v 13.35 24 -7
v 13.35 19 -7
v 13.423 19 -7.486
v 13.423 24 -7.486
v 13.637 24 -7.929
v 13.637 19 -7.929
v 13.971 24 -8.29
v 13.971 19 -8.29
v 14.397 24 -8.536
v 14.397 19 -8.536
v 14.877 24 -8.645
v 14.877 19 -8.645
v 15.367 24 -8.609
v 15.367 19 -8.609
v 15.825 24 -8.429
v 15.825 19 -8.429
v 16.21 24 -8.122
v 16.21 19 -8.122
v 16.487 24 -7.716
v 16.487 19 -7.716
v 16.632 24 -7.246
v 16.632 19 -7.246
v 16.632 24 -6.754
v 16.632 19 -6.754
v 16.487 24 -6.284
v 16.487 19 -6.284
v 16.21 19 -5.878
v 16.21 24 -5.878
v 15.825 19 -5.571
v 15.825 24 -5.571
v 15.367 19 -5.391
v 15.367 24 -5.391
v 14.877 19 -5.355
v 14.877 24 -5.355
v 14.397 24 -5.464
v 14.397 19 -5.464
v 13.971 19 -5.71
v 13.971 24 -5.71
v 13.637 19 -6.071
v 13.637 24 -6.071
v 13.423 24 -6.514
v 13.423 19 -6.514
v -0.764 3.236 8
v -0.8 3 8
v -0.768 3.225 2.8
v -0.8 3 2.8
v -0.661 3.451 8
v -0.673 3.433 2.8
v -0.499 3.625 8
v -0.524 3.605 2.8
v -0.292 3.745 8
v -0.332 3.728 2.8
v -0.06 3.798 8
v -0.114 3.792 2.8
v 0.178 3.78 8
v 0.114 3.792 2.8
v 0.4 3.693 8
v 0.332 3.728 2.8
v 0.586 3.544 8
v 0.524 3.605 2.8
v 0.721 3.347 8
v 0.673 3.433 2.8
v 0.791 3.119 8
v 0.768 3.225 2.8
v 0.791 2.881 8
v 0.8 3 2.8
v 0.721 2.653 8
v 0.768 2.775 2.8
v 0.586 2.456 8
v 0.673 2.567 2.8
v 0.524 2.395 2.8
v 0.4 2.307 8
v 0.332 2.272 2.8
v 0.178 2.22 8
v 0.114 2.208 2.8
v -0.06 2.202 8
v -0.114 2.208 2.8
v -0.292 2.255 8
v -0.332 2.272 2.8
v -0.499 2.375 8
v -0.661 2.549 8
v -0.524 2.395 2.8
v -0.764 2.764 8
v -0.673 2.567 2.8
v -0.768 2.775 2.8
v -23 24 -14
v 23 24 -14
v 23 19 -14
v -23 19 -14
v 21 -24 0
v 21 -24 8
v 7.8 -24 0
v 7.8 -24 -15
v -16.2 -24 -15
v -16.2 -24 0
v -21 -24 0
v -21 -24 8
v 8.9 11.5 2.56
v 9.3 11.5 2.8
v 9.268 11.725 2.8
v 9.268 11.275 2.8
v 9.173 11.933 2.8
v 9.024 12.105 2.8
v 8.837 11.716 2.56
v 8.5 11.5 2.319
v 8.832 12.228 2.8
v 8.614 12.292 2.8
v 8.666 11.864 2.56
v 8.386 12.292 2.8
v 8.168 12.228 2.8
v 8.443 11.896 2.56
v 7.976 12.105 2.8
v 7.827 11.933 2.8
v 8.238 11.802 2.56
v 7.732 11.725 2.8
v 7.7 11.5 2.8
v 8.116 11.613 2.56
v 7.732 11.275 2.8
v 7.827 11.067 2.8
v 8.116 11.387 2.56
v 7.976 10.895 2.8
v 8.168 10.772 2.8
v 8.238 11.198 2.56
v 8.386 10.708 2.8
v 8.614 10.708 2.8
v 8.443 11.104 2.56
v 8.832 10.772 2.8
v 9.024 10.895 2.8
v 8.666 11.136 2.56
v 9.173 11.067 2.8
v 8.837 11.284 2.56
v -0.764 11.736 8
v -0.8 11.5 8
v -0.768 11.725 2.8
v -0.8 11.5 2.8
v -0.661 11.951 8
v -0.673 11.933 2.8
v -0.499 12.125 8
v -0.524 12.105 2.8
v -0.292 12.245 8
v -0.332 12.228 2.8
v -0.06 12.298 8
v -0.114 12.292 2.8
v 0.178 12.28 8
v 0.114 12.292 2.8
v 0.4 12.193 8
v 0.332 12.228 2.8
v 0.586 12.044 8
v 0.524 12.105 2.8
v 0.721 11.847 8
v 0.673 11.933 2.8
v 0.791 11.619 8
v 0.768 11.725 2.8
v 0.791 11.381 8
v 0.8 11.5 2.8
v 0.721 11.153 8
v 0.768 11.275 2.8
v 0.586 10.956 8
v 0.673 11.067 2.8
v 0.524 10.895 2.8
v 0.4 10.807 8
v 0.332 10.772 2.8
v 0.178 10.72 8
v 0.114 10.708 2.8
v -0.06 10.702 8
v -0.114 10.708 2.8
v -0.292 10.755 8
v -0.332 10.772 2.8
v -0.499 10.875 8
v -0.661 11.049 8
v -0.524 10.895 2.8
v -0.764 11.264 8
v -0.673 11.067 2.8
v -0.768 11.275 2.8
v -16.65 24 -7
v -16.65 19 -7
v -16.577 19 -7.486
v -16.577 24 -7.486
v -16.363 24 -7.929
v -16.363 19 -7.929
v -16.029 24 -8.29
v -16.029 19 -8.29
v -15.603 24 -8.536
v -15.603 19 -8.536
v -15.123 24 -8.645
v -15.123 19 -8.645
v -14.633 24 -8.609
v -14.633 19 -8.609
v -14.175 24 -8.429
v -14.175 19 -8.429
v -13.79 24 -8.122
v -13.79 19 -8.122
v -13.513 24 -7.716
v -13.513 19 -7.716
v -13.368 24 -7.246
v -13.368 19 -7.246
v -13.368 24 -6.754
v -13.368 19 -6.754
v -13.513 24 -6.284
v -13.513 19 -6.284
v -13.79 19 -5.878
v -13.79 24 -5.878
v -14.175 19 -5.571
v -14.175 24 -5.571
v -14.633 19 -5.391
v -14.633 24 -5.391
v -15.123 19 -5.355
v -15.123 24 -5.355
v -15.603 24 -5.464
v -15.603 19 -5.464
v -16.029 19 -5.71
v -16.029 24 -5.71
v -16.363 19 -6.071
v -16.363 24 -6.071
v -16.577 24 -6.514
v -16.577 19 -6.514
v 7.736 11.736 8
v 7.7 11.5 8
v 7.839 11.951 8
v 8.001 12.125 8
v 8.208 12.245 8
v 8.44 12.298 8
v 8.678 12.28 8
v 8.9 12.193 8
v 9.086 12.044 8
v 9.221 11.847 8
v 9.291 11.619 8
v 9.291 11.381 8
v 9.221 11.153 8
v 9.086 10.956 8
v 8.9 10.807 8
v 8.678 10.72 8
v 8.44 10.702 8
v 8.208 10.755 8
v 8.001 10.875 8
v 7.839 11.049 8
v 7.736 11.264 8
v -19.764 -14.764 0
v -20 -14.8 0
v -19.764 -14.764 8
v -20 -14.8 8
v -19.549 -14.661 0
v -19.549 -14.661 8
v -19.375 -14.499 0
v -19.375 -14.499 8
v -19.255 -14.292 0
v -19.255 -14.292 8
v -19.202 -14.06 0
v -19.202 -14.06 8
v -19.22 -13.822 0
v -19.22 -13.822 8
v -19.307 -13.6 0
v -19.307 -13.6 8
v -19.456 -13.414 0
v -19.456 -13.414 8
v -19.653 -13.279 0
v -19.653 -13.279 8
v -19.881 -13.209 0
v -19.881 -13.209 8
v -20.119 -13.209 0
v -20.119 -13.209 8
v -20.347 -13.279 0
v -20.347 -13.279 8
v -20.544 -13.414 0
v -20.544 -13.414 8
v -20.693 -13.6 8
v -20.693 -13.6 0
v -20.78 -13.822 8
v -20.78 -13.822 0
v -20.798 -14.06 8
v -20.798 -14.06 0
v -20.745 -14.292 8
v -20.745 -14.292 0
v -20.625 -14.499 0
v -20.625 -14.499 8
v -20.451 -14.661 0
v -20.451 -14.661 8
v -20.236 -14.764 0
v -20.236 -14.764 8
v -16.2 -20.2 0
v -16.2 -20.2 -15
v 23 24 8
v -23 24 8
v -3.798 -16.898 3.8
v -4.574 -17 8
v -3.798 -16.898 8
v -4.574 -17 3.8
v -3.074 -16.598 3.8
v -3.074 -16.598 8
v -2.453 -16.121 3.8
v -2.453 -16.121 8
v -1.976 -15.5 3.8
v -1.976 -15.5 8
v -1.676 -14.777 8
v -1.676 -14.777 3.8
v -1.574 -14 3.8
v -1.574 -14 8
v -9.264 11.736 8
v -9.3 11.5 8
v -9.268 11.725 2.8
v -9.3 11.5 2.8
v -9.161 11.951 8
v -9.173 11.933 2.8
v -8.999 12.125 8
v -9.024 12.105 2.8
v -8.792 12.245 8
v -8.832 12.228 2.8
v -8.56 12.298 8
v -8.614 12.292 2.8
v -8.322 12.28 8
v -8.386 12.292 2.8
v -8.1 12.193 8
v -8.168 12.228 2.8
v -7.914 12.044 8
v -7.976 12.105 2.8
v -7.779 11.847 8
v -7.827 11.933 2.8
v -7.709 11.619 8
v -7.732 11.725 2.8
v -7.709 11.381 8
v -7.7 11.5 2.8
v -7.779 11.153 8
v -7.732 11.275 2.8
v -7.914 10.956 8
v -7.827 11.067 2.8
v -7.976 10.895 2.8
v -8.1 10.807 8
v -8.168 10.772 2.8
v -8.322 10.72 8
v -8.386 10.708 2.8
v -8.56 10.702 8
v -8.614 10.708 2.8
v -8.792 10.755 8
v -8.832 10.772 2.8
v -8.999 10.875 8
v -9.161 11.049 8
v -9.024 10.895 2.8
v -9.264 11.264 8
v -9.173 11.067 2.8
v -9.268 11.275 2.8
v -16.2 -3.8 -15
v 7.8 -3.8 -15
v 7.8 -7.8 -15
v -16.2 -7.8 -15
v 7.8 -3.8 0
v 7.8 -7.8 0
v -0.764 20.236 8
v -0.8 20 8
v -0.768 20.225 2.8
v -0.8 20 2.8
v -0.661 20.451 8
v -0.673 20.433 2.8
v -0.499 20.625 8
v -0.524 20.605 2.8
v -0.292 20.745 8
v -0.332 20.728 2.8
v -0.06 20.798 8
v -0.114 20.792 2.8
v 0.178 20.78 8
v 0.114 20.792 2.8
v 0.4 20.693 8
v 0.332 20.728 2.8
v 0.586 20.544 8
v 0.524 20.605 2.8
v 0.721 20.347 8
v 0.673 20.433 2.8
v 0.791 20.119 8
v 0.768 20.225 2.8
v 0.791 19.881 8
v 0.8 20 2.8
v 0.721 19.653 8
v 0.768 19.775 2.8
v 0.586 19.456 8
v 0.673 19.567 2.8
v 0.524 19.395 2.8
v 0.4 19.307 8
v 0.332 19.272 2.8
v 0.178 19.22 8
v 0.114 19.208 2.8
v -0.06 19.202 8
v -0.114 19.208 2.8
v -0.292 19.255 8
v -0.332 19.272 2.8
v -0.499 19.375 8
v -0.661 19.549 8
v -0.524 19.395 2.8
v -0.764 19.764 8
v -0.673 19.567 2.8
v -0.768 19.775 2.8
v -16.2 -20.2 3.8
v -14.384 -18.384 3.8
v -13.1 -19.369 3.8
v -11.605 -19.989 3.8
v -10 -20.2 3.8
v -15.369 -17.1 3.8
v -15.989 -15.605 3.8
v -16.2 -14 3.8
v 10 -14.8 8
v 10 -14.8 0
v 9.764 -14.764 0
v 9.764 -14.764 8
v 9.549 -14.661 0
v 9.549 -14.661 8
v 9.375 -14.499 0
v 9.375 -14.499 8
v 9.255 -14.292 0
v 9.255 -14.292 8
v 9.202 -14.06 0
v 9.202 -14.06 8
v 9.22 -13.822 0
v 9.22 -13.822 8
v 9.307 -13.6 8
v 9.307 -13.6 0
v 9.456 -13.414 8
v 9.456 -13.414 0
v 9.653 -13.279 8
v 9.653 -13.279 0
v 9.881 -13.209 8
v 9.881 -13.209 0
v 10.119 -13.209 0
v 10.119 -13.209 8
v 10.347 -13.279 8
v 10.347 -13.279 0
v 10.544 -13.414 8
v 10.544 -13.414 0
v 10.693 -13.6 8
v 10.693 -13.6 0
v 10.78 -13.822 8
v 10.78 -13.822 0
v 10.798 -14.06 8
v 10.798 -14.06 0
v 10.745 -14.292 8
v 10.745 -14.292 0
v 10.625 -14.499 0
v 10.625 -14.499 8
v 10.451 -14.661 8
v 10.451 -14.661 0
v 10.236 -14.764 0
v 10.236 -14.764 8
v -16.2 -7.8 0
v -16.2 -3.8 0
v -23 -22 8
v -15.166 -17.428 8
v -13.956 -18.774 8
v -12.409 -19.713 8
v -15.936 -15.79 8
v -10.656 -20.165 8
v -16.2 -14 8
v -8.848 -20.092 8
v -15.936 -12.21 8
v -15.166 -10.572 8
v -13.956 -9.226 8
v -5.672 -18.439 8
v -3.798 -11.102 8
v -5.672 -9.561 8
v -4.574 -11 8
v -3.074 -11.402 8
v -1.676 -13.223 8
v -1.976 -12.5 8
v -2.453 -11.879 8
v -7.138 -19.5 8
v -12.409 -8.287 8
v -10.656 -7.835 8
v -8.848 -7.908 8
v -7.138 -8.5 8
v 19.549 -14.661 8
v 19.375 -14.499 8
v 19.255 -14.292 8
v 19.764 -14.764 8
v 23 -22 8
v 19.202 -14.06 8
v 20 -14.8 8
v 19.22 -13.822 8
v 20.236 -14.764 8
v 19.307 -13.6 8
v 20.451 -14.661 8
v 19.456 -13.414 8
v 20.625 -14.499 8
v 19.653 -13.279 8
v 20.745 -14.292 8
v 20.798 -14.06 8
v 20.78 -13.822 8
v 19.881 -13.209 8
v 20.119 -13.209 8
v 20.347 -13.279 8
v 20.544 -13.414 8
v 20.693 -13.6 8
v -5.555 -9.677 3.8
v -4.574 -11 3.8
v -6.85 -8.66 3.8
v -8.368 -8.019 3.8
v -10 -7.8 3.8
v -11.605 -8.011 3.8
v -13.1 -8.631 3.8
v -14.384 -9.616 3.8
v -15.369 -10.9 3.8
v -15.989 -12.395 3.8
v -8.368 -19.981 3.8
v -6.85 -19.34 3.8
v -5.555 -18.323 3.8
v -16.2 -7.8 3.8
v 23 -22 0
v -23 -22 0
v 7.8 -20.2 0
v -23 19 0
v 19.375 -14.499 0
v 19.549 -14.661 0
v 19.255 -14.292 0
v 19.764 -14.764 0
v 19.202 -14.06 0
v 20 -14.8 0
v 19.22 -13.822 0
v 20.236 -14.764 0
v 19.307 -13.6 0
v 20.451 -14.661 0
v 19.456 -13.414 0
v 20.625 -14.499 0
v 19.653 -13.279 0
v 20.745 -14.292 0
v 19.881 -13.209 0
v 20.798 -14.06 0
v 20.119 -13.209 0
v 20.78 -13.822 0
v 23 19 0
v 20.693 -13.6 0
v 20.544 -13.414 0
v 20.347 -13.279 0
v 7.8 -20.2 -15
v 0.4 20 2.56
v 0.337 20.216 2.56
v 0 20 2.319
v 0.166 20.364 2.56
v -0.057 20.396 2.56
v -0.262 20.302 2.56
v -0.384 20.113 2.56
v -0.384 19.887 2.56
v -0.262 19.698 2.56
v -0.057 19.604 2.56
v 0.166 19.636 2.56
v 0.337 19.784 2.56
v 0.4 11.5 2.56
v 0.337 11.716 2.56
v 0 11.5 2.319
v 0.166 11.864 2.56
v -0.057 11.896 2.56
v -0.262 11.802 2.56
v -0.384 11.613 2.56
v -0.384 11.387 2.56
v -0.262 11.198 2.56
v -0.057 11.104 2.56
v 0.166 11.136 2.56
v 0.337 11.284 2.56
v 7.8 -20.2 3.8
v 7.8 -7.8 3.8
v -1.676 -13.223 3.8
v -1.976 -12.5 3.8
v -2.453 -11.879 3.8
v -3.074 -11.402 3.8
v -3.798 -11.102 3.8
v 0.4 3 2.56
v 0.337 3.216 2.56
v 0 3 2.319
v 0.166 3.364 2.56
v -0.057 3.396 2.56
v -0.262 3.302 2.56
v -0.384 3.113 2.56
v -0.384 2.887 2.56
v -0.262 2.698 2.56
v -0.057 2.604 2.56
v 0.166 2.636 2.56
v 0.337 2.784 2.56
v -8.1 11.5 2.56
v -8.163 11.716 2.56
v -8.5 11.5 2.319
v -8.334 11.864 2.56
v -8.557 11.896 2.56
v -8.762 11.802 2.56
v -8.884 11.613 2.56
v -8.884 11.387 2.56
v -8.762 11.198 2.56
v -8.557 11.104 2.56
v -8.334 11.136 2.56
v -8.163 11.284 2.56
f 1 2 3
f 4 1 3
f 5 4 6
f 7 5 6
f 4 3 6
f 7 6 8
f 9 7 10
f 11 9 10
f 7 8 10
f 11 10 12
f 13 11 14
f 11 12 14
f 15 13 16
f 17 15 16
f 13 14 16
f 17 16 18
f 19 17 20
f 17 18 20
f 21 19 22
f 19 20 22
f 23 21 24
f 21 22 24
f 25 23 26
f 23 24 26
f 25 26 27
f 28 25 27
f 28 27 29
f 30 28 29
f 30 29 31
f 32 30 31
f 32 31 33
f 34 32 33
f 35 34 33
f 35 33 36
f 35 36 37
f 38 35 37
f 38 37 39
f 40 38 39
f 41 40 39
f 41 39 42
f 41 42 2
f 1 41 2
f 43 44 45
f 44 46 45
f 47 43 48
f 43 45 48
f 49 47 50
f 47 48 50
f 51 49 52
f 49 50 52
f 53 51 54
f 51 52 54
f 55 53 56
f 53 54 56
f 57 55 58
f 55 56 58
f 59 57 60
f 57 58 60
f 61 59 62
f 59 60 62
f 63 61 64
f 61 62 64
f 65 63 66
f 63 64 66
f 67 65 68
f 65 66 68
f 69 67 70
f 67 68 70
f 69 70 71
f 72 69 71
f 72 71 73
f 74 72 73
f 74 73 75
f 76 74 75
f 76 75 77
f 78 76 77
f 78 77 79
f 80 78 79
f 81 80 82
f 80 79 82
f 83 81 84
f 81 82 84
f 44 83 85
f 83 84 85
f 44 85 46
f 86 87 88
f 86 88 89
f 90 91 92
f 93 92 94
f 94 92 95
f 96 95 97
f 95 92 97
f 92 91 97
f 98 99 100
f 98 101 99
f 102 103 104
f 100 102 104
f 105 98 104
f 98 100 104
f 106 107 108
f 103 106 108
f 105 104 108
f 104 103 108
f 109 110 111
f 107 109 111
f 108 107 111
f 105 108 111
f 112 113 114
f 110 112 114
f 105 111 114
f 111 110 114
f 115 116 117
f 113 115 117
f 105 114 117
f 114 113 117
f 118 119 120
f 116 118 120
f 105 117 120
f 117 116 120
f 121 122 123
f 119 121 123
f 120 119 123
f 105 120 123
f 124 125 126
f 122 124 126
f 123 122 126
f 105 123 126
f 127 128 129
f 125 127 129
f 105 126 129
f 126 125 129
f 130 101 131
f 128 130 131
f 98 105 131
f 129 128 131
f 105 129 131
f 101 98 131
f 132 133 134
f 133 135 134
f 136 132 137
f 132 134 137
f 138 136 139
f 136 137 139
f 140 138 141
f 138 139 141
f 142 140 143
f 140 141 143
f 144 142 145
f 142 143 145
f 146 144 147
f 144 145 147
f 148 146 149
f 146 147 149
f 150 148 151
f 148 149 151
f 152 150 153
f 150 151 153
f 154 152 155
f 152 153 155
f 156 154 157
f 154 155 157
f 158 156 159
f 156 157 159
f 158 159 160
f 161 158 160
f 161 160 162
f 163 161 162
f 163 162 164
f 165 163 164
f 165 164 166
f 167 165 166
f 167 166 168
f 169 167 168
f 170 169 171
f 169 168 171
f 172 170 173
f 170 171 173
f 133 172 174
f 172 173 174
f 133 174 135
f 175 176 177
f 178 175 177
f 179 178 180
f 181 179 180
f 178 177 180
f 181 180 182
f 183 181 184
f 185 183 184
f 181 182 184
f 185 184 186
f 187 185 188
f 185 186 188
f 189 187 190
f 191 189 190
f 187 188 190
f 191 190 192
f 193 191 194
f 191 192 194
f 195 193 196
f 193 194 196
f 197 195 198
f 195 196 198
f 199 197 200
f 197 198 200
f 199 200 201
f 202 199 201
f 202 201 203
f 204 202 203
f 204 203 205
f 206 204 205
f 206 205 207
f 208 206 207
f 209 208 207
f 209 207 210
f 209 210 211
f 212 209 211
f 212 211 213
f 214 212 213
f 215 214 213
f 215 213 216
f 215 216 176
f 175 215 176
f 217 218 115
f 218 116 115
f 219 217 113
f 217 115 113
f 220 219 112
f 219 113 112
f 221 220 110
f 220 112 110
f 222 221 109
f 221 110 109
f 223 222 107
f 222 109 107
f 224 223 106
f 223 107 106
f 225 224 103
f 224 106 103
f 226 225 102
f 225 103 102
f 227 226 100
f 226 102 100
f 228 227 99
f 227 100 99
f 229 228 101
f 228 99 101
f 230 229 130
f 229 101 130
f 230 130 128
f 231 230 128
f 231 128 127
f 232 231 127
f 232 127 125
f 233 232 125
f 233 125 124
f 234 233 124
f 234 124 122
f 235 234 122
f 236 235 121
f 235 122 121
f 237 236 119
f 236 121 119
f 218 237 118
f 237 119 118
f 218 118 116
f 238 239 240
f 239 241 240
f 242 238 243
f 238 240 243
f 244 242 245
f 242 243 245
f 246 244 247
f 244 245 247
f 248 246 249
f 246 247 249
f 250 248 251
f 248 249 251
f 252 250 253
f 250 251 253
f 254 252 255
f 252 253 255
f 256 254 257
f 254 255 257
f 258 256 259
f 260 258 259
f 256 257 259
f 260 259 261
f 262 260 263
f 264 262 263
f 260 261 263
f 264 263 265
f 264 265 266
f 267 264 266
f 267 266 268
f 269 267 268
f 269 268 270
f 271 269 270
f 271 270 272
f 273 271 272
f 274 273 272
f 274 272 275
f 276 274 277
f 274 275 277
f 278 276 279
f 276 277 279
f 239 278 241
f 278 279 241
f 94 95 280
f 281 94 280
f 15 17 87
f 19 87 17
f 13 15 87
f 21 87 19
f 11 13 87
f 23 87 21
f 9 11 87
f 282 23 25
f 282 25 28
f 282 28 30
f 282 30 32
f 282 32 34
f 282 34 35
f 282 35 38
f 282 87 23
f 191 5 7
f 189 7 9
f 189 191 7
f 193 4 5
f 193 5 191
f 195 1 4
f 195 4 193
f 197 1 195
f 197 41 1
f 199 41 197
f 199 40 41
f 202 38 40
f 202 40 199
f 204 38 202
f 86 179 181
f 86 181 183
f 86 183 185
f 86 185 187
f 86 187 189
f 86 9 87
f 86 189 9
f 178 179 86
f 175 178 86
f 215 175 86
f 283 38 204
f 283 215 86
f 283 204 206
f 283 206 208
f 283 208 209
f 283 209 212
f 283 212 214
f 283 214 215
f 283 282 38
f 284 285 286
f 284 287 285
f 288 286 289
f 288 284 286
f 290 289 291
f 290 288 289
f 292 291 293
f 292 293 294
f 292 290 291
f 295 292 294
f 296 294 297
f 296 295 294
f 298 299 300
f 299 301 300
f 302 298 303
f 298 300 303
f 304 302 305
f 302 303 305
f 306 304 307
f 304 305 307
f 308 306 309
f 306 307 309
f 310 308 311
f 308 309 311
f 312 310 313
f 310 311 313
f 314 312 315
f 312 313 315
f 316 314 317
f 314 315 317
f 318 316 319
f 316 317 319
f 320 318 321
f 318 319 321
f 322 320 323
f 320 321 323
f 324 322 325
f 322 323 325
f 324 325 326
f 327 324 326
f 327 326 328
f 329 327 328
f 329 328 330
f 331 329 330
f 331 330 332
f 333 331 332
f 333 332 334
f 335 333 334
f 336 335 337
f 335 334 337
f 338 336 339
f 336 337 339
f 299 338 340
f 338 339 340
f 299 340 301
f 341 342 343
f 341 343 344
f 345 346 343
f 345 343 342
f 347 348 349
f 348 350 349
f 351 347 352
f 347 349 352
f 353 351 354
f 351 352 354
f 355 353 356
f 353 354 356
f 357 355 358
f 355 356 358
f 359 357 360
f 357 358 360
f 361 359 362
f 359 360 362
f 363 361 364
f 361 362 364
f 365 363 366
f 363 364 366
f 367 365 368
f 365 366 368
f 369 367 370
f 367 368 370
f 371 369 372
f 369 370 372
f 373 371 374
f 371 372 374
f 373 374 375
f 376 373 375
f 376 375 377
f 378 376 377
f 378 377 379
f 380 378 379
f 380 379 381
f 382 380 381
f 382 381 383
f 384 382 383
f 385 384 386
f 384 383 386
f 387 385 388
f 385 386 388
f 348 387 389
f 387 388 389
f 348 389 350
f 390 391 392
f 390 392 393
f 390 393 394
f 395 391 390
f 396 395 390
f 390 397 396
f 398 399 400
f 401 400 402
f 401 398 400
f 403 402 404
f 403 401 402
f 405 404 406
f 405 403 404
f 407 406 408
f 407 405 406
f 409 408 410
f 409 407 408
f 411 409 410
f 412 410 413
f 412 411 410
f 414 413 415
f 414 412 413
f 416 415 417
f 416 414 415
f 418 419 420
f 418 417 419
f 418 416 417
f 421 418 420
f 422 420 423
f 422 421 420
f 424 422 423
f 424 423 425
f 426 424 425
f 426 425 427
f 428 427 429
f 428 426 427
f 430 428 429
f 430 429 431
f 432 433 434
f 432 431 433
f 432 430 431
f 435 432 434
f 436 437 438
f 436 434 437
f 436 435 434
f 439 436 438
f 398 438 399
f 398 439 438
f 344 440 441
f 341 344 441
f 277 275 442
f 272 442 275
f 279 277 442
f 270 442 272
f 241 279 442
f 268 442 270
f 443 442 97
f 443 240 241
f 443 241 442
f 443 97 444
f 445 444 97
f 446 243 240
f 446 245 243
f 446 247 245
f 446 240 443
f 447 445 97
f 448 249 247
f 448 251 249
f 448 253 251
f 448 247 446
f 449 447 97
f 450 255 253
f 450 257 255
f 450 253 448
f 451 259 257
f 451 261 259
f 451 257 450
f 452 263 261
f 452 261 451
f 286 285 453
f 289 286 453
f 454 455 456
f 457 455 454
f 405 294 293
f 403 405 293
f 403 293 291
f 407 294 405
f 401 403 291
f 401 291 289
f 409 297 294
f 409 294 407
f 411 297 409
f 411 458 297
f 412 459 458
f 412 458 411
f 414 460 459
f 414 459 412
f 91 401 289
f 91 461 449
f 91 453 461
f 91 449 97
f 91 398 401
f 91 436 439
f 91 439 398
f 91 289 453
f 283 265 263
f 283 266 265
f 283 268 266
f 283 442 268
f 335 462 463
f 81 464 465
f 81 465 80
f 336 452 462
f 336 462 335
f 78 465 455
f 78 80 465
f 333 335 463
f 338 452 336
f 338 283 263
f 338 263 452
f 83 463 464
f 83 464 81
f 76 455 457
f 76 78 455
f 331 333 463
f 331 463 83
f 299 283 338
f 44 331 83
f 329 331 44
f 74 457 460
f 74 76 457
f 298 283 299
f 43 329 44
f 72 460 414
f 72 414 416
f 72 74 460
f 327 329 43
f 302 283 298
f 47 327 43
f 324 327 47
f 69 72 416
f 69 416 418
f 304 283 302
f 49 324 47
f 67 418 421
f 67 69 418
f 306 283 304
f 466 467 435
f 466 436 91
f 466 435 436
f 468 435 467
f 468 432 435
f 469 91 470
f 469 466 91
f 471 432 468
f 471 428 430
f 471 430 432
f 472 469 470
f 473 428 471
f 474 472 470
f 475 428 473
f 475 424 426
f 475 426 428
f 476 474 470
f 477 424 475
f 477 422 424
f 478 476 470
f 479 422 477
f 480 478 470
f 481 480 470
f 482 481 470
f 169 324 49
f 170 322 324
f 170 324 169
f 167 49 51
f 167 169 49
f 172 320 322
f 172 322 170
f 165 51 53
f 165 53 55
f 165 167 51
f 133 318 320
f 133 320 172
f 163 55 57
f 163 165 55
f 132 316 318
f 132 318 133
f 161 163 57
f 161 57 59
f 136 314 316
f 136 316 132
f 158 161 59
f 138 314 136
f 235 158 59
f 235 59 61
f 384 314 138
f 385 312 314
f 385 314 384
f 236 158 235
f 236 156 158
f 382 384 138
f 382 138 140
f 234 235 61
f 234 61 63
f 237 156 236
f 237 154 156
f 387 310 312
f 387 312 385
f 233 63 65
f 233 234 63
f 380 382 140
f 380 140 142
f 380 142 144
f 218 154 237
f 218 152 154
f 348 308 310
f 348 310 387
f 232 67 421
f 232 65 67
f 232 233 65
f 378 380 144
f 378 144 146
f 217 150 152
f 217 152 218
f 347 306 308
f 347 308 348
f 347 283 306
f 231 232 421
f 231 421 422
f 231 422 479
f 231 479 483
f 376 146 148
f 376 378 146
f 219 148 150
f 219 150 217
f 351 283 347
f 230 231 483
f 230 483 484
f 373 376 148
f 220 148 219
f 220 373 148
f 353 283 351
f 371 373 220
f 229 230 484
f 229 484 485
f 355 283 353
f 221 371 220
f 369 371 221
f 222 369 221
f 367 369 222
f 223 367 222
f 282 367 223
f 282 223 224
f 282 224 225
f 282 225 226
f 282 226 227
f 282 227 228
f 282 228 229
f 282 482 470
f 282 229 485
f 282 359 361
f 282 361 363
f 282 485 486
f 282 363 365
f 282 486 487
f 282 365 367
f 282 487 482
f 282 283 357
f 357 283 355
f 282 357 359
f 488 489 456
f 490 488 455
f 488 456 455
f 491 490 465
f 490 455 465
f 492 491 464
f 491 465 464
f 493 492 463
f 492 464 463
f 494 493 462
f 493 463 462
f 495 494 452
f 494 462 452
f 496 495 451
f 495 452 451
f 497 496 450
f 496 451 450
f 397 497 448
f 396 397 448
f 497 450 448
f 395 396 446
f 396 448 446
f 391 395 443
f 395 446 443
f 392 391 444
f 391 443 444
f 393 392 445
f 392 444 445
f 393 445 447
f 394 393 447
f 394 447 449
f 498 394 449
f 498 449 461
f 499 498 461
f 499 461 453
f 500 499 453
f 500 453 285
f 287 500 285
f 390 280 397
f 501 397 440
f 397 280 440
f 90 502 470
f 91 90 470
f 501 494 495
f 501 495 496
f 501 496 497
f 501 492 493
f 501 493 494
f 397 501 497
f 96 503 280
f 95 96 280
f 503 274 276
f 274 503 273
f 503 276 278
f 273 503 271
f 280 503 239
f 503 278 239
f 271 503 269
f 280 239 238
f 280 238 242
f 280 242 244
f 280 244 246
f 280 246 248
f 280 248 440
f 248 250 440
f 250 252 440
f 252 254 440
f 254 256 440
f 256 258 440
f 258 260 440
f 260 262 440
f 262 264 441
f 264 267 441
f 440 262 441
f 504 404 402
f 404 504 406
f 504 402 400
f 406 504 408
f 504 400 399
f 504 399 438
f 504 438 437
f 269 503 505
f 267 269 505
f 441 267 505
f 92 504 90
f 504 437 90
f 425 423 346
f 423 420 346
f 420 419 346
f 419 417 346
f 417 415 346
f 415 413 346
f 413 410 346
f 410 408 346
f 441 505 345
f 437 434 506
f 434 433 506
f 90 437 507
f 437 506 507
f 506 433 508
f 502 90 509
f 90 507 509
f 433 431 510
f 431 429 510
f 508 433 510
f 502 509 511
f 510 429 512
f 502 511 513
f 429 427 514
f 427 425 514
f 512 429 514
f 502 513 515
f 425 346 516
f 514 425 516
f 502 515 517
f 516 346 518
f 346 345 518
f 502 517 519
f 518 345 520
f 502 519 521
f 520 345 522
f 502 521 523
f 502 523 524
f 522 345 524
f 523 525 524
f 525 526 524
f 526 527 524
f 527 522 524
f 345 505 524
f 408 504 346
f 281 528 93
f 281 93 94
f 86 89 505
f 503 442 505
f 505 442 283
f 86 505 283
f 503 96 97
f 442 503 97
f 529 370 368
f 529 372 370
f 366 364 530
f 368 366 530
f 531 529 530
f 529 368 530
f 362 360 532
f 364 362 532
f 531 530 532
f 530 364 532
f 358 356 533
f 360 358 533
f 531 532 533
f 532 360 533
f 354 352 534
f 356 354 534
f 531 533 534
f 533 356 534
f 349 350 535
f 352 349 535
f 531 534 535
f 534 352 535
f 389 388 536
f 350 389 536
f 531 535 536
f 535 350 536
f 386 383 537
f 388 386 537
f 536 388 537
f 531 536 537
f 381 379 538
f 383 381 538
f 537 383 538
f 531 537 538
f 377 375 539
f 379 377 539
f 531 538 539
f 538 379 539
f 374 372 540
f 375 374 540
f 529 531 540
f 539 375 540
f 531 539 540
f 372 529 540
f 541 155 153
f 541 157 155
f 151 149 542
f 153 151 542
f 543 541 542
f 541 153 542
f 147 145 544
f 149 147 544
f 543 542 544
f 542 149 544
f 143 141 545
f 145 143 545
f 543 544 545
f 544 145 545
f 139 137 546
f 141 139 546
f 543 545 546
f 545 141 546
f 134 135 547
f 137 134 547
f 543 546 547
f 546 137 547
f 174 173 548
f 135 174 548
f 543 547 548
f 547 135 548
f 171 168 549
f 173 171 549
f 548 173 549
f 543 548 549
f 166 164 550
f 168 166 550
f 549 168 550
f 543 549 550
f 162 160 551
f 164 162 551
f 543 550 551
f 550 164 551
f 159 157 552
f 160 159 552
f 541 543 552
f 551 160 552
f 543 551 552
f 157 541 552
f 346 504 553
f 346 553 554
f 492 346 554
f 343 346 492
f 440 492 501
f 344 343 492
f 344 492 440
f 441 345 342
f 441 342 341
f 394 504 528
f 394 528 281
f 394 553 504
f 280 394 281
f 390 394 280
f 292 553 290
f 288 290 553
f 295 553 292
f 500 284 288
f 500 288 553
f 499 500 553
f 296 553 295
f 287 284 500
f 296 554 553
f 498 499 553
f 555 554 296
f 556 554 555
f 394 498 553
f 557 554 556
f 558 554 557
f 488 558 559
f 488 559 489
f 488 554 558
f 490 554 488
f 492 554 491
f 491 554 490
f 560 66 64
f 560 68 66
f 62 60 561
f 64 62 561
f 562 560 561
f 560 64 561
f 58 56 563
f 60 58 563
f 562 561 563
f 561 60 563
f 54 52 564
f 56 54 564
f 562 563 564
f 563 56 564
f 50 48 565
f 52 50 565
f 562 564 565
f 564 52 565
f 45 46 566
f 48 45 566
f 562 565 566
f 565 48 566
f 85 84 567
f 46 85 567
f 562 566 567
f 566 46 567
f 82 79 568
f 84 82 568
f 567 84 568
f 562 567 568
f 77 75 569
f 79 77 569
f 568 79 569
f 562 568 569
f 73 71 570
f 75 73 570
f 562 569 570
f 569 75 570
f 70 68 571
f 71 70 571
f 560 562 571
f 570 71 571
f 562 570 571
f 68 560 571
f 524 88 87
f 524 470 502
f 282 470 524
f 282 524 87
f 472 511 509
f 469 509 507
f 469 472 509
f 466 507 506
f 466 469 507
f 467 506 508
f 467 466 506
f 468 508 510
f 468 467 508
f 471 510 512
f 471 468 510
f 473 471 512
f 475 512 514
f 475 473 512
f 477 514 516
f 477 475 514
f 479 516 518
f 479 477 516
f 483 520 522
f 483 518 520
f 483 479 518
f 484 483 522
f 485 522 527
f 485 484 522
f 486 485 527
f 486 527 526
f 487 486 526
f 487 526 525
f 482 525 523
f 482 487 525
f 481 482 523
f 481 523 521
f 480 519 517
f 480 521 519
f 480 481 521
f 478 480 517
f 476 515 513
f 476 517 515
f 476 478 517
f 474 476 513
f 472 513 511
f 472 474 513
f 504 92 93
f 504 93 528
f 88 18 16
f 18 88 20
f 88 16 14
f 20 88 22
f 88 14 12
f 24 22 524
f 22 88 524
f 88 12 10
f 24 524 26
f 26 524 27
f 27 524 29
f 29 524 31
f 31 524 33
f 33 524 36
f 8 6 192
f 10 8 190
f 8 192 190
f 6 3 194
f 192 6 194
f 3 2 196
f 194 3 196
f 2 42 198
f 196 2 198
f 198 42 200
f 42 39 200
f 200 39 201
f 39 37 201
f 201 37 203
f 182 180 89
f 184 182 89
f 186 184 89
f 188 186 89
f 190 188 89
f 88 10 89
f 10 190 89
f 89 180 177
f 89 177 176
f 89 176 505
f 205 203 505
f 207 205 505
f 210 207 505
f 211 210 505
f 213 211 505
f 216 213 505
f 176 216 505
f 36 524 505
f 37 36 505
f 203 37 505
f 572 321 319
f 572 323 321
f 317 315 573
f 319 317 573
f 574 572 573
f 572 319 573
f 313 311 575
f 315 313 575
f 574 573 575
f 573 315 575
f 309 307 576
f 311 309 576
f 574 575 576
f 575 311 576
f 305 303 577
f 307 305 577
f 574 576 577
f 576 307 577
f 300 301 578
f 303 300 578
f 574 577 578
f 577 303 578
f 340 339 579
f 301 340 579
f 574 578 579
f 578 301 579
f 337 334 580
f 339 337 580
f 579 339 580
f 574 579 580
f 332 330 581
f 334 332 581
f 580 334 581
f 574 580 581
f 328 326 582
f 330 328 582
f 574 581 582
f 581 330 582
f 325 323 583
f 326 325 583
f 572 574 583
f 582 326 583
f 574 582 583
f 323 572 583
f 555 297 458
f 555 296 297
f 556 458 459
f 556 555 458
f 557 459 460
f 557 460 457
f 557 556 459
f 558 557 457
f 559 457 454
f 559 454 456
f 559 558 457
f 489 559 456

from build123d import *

# Parameters (mm, degrees)
SKETCH_1_W                  = 46
SKETCH_1_H                  = 48
EXTRUDE_1_DEPTH             = 8
CHAMFER_1_SIZE              = 2
SKETCH_2_W                  = 46
SKETCH_2_H                  = 5
EXTRUDE_2_DEPTH             = 14
HOLE_WIZARD_M4_1_D          = 3.3
HOLE_WIZARD_M4_1_DEPTH      = 11.5
HOLE_WIZARD_M4_1_TIP        = 0.991420021
HOLE_WIZARD_M2_1_AT_2_COUNT = 2
HOLE_WIZARD_M2_1_AT_2_PITCH = 10
SKETCH_8_R                  = 0.8
CUT_EXTRUDE_1_DEPTH         = 23
SKETCH_9_W                  = 24
SKETCH_9_H                  = 12.4
CUT_EXTRUDE_2_DEPTH         = 3.8
SKETCH_11_W                 = 24
SKETCH_11_H                 = 3.8
SKETCH_11_H_2               = 4
EXTRUDE_3_DEPTH             = 15
FILLET_1_R                  = 3
HOLE_WIZARD_M2_2_D          = 1.6
HOLE_WIZARD_M2_2_DEPTH      = 5.2
HOLE_WIZARD_M2_2_TIP        = 0.480688495
HOLE_WIZARD_M2_3_D          = 1.6
HOLE_WIZARD_M2_3_DEPTH      = 5.2
HOLE_WIZARD_M2_3_TIP        = 0.480688495


with BuildPart() as part:
    # 草图1 → 凸台-拉伸1 (new body)
    with BuildSketch(Plane.XY):
        Rectangle(SKETCH_1_W, SKETCH_1_H)
    extrude(amount=EXTRUDE_1_DEPTH)

    # 倒角1
    chamfer_1_edges = [part.edges().sort_by_distance(p)[0] for p in [
        (23, -24, 4),
        (-23, -24, 4),
    ]]
    chamfer(chamfer_1_edges, length=CHAMFER_1_SIZE)

    # 草图2 → 凸台-拉伸2 (add)
    with BuildSketch(Plane(origin=(0, 0, 0), x_dir=(-1, 0, 0), z_dir=(0, 0, -1))):
        with Locations((0, 21.5)):
            Rectangle(SKETCH_2_W, SKETCH_2_H)
    extrude(amount=EXTRUDE_2_DEPTH)

    # M4 螺纹孔1
    with Locations(Plane(origin=(0, 24, 0), x_dir=(1, 0, 0), z_dir=(0, 1, 0))):
        with Locations((15, 7), (-15, 7)):
            Hole(HOLE_WIZARD_M4_1_D / 2, depth=HOLE_WIZARD_M4_1_DEPTH)
            with Locations((0, 0, -(HOLE_WIZARD_M4_1_DEPTH + HOLE_WIZARD_M4_1_TIP / 2))):  # 118° drill point
                Cone(0, HOLE_WIZARD_M4_1_D / 2, HOLE_WIZARD_M4_1_TIP, mode=Mode.SUBTRACT)

    # 草图6 → M2 螺纹孔1 (revolve, cut)
    with BuildSketch(Plane(origin=(10, -14, 8), x_dir=(0, -1, 0), z_dir=(1, 0, 0))):
        Polygon((0, 0), (0, 46.480688495), (0.8, 46), (0.8, 0), align=None)
    hole_wizard_m2_1 = revolve(axis=Axis((10, -14, 14.35), (0, 0, -1)), mode=Mode.SUBTRACT)

    # M2 螺纹孔1 at 2: M2 螺纹孔1 ×2
    with Locations(*[(i * HOLE_WIZARD_M2_1_AT_2_PITCH, 0, 0) for i in range(1, HOLE_WIZARD_M2_1_AT_2_COUNT)]):
        add(hole_wizard_m2_1, mode=Mode.SUBTRACT)

    # 镜向1: M2 螺纹孔1 across plane
    add(hole_wizard_m2_1.mirror(Plane(origin=(0, 0, 0), x_dir=(0, 0, 1), z_dir=(1, 0, 0))), mode=Mode.SUBTRACT)

    # 镜向1 copy 1 sketch → 镜向1 copy 1 (revolve, cut)
    with BuildSketch(Plane(origin=(-20, -14, 8), x_dir=(0, -1, 0), z_dir=(-1, 0, 0))):
        Polygon((0, 0), (0, -46.480688495), (0.8, -46), (0.8, 0), align=None)
    revolve(axis=Axis((-20, -14, 14.35), (0, 0, 1)), mode=Mode.SUBTRACT)

    # 草图8 → 切除-拉伸1 (cut)
    # profile 1 of 3: a face of its own
    with BuildSketch(Plane.XY.offset(8)):
        with BuildLine():
            ThreePointArc((-4.574136013, -11), (-16.2, -14), (-4.574136013, -17))
            Line((-4.574136013, -17), (-4.574136013, -11))
        make_face()
        with Locations((-10, -14)):
            Circle(SKETCH_8_R, mode=Mode.SUBTRACT)
    # profile 2 of 3: a face of its own
    with BuildSketch(Plane.XY.offset(8)):
        with BuildLine():
            Line((-4.574136013, -11), (-4.574136013, -17))
            ThreePointArc((-4.574136013, -17), (-3.996652737, -15.549135773), (-3.8, -14))
            ThreePointArc((-3.8, -14), (-3.996652737, -12.450864227), (-4.574136013, -11))
        make_face()
    # profile 3 of 3: a face of its own
    with BuildSketch(Plane.XY.offset(8)):
        with BuildLine():
            ThreePointArc((-3.8, -14), (-3.996652737, -15.549135773), (-4.574136013, -17))
            Line((-4.574136013, -17), (-1.574136013, -17))
            Line((-1.574136013, -17), (-1.574136013, -11))
            Line((-1.574136013, -11), (-4.574136013, -11))
            ThreePointArc((-4.574136013, -11), (-3.996652737, -12.450864227), (-3.8, -14))
        make_face()
    extrude(amount=-CUT_EXTRUDE_1_DEPTH, mode=Mode.SUBTRACT)

    # 草图9 → 切除-拉伸2 (cut)
    with BuildSketch(Plane(origin=(0, 0, 0), x_dir=(-1, 0, 0), z_dir=(0, 0, -1))):
        with Locations((4.2, -14)):
            Rectangle(SKETCH_9_W, SKETCH_9_H)
    extrude(amount=-CUT_EXTRUDE_2_DEPTH, mode=Mode.SUBTRACT)

    # 草图11 → 凸台-拉伸3 (add)
    with BuildSketch(Plane(origin=(0, 0, 0), x_dir=(-1, 0, 0), z_dir=(0, 0, -1))):
        with Locations((4.2, -22.1)):
            Rectangle(SKETCH_11_W, SKETCH_11_H)
        with Locations((4.2, -5.8)):
            Rectangle(SKETCH_11_W, SKETCH_11_H_2)
    extrude(amount=EXTRUDE_3_DEPTH)

    # 圆角1
    fillet_1_edges = [part.edges().sort_by_distance(p)[0] for p in [
        (-1.574136013, -11, 5.9),
        (-1.574136013, -17, 5.9),
    ]]
    fillet(fillet_1_edges, radius=FILLET_1_R - 0.0001)  # a hair under: the kernel refuses the full size

    # M2 螺纹孔2
    with Locations(Plane.XY.offset(8)):
        with Locations((0, 11.5)):
            Hole(HOLE_WIZARD_M2_2_D / 2, depth=HOLE_WIZARD_M2_2_DEPTH)
            with Locations((0, 0, -(HOLE_WIZARD_M2_2_DEPTH + HOLE_WIZARD_M2_2_TIP / 2))):  # 118° drill point
                Cone(0, HOLE_WIZARD_M2_2_D / 2, HOLE_WIZARD_M2_2_TIP, mode=Mode.SUBTRACT)

    # M2 螺纹孔3
    with Locations(Plane(origin=(0, 20, 8), x_dir=(1, 0, 0), z_dir=(0, 0, 1))):
        with Locations((0, 0), (8.5, -8.5), (0, -17), (-8.5, -8.5)):
            Hole(HOLE_WIZARD_M2_3_D / 2, depth=HOLE_WIZARD_M2_3_DEPTH)
            with Locations((0, 0, -(HOLE_WIZARD_M2_3_DEPTH + HOLE_WIZARD_M2_3_TIP / 2))):  # 118° drill point
                Cone(0, HOLE_WIZARD_M2_3_D / 2, HOLE_WIZARD_M2_3_TIP, mode=Mode.SUBTRACT)


solid = part.part
